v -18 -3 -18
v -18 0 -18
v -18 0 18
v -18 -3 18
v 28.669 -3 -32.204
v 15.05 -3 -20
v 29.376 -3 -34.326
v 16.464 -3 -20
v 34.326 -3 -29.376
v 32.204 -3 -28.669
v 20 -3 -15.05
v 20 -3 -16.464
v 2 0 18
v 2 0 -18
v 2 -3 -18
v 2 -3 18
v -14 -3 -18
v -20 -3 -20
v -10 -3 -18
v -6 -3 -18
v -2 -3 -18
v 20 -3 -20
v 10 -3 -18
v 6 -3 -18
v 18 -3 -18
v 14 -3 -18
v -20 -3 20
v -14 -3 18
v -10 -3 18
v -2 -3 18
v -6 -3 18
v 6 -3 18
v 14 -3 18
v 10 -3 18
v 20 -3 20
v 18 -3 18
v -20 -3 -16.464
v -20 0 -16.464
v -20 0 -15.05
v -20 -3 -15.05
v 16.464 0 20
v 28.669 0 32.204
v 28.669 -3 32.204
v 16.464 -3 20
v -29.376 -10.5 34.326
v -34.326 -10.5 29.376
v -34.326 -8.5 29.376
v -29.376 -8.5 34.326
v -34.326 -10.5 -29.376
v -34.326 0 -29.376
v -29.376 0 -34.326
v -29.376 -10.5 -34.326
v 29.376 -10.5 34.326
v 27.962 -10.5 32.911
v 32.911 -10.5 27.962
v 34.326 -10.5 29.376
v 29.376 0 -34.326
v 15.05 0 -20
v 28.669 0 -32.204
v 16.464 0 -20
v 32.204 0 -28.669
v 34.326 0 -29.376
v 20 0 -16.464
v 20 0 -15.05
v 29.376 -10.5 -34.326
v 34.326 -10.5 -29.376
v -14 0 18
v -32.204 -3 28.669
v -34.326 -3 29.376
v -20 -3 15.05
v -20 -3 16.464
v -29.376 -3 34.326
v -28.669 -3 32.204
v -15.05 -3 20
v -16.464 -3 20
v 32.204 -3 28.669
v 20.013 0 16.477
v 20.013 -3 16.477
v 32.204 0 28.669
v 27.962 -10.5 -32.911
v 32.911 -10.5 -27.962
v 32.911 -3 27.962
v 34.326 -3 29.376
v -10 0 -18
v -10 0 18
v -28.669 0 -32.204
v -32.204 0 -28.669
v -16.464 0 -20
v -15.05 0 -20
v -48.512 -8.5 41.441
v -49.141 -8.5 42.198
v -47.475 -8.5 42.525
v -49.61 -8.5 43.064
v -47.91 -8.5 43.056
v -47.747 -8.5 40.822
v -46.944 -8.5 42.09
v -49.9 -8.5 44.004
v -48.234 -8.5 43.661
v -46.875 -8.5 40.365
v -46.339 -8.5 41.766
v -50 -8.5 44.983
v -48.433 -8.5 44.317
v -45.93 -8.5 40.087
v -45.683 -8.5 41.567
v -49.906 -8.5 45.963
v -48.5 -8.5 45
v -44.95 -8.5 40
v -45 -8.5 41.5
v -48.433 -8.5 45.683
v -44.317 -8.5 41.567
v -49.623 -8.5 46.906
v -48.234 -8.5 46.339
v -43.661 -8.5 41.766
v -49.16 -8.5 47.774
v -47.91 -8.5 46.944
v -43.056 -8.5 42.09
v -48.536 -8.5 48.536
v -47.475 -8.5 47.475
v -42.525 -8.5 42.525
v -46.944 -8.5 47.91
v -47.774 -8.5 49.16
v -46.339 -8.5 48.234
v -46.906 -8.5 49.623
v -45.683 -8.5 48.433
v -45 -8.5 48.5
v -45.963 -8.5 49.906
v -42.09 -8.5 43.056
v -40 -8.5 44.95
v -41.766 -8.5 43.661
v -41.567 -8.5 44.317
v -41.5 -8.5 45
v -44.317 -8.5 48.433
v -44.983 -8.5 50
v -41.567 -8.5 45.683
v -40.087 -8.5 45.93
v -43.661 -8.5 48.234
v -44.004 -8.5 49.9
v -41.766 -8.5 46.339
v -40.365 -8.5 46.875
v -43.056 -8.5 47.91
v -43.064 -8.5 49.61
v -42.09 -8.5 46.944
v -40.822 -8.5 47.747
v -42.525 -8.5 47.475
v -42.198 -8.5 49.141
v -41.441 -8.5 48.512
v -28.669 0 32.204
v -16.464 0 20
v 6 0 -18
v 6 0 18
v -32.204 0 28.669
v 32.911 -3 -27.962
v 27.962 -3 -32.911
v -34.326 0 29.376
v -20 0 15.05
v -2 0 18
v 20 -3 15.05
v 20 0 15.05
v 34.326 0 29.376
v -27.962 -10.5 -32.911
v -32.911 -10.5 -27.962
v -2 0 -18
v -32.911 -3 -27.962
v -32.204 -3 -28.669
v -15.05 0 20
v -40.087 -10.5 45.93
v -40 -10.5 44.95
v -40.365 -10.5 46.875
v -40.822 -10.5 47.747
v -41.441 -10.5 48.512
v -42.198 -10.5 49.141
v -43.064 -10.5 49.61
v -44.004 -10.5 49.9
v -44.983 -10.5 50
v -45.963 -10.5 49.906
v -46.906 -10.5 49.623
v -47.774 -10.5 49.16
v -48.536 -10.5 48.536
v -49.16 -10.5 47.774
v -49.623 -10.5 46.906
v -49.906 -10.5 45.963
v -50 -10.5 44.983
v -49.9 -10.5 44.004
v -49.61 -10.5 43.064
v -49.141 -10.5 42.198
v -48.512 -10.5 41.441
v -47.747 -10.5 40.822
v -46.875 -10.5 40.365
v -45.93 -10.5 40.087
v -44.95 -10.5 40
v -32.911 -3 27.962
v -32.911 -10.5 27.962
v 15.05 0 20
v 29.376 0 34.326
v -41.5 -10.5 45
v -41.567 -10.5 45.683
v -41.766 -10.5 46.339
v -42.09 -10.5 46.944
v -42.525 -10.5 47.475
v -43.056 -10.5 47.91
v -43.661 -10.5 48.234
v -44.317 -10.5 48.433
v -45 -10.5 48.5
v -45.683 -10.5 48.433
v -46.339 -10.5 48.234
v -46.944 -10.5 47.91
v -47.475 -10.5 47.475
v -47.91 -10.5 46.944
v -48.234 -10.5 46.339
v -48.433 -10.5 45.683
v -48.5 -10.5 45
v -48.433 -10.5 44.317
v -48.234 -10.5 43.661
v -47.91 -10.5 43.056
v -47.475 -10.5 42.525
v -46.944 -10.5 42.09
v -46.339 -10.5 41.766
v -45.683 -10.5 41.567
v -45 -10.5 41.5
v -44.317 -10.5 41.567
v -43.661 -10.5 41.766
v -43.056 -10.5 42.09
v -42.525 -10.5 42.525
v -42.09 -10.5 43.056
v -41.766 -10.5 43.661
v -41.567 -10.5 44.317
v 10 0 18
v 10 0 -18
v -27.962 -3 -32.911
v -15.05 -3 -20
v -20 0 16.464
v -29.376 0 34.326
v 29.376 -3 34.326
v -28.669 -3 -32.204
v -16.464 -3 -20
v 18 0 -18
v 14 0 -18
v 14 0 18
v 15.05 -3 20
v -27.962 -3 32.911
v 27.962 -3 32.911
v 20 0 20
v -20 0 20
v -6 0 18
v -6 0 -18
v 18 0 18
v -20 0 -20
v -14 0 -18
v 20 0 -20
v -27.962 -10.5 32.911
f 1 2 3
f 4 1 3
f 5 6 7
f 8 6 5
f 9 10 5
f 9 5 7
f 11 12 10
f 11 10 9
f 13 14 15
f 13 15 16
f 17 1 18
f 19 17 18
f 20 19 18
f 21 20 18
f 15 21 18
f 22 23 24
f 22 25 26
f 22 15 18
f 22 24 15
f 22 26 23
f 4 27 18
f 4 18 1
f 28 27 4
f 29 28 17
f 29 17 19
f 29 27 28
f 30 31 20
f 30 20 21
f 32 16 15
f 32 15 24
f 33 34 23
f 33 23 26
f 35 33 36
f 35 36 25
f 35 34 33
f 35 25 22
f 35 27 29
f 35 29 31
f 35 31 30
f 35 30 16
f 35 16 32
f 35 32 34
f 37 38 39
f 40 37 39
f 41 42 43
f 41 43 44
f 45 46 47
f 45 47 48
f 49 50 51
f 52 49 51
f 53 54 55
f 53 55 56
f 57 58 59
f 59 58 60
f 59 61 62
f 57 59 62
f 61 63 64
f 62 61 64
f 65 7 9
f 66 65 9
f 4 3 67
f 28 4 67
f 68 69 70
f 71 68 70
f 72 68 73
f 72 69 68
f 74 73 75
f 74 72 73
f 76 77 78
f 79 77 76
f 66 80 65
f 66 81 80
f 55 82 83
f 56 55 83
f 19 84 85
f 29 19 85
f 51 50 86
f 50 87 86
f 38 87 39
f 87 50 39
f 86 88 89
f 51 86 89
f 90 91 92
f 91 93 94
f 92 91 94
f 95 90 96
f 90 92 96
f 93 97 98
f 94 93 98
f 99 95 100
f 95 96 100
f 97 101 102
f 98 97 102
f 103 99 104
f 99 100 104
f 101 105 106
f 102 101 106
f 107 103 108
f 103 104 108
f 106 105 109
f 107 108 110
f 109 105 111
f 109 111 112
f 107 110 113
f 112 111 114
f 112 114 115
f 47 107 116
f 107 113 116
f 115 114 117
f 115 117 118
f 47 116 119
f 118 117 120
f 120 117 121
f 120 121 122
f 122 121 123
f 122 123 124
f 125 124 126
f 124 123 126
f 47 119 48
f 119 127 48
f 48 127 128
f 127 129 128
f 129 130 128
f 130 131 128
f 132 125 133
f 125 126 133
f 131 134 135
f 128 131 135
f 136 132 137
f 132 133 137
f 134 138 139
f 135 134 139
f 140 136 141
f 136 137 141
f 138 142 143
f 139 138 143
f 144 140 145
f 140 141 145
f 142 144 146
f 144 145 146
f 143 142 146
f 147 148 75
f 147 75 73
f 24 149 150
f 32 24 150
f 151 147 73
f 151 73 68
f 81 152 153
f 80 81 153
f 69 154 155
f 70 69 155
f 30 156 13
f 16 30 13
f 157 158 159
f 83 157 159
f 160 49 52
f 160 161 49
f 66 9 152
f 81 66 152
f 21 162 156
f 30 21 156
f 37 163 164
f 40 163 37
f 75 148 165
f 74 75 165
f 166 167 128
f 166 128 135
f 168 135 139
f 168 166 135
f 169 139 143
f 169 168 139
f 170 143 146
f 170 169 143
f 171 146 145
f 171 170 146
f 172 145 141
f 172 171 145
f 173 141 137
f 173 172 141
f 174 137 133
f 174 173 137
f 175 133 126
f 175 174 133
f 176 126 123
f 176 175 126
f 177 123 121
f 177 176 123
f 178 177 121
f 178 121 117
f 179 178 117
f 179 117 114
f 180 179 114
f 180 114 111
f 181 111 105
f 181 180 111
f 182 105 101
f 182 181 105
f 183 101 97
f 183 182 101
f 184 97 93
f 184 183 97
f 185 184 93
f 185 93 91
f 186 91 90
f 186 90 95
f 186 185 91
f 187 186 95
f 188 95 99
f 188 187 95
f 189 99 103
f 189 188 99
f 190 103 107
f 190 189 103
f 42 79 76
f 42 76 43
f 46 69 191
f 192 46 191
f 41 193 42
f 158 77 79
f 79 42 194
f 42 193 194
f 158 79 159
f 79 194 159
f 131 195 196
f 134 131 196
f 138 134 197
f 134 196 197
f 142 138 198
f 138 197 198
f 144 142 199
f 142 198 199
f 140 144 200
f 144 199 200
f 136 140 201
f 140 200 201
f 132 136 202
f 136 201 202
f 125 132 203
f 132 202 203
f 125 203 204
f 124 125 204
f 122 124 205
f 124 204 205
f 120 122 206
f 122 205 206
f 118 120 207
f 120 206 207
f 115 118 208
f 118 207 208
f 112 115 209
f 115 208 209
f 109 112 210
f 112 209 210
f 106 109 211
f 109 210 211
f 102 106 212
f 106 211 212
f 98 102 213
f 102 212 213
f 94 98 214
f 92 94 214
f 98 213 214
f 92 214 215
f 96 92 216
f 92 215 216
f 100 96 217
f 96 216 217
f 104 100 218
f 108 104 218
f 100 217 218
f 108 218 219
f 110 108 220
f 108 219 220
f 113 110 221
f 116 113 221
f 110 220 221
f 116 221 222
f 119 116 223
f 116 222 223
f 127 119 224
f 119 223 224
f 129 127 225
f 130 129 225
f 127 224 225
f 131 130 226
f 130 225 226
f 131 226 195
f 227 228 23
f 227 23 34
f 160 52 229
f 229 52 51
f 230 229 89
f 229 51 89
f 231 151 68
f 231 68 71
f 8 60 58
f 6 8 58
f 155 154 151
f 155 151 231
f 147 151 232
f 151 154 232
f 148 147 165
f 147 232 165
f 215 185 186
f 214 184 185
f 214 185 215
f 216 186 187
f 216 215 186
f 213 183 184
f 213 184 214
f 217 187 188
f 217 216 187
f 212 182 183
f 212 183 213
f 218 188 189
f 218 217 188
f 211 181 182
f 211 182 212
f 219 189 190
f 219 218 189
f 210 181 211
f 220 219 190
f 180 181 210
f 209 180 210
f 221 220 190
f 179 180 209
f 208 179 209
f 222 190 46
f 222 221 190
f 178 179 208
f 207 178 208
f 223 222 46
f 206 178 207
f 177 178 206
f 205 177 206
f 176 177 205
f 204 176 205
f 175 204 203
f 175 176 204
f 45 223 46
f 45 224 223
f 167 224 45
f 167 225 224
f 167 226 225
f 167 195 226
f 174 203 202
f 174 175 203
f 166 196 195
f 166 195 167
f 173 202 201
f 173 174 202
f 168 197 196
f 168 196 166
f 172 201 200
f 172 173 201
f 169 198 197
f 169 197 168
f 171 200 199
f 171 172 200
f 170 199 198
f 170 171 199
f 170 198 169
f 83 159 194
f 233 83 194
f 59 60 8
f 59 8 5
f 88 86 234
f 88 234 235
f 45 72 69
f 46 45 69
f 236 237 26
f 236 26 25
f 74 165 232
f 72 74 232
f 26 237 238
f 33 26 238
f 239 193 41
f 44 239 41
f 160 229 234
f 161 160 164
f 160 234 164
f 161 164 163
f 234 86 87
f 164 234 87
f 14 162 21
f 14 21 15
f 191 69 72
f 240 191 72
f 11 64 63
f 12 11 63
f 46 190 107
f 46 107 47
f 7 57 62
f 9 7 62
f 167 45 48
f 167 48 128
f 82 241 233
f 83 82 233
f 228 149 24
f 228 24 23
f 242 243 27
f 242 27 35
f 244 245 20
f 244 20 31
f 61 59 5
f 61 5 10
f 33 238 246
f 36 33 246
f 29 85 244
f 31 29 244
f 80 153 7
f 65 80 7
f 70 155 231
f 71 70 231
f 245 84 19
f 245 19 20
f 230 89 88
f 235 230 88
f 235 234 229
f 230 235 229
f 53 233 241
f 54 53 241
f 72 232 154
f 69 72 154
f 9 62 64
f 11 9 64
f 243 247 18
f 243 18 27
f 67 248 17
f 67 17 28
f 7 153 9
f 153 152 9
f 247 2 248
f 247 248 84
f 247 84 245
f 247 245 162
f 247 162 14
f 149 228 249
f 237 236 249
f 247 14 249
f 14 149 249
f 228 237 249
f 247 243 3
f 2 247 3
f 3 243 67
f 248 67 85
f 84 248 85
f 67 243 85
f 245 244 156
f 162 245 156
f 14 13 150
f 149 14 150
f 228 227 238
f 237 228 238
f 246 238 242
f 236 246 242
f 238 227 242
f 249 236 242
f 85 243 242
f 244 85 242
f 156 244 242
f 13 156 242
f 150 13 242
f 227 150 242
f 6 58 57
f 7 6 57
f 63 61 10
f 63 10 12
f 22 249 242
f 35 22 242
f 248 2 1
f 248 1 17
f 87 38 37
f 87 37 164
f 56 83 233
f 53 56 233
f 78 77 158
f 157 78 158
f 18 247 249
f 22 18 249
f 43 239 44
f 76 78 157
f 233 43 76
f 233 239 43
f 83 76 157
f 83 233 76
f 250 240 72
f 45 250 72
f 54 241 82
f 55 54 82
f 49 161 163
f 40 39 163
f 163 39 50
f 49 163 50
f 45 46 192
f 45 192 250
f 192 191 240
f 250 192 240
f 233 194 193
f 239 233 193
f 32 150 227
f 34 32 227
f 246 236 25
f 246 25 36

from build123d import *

# Parameters (mm, degrees)
F0_W      = 40
F0_H      = 40
F0_W_2    = 4
F0_H_2    = 36
F1_DEPTH  = 3
F3_DEPTH  = 3
F4_DEPTH  = 25
F5_DEPTH  = 25
F6_DEPTH  = 25
F7_DEPTH  = 25
F9_DEPTH  = 7.5
F10_R     = 3.5
F11_DEPTH = 2


# Not quite as in the source:
# - the program builds the solid bodies; features that only make, move or delete a surface that nothing else refers to are left out


with BuildPart() as f1:
    # F0 (on Front) → F1 (new body)
    with BuildSketch(Plane.XZ):
        Rectangle(F0_W, F0_H)
        with Locations((-16, 0)):
            Rectangle(F0_W_2, F0_H_2, mode=Mode.SUBTRACT)
        with Locations((-8, 0)):
            Rectangle(F0_W_2, F0_H_2, mode=Mode.SUBTRACT)
        Rectangle(F0_W_2, F0_H_2, mode=Mode.SUBTRACT)
        with Locations((8, 0)):
            Rectangle(F0_W_2, F0_H_2, mode=Mode.SUBTRACT)
        with Locations((16, 0)):
            Rectangle(F0_W_2, F0_H_2, mode=Mode.SUBTRACT)
    extrude(amount=F1_DEPTH)


with BuildPart() as f3:
    # F2 (on Front) → F3 (new body)
    with BuildSketch(Plane.XZ):
        Polygon((27.9616906966, 32.9114381649), (15.0502525317, 20), (16.4644660941, 20), (28.6687974778, 32.2043313837), align=None)
        Polygon((29.3759042589, 34.3256517272), (27.9616906966, 32.9114381649), (28.6687974778, 32.2043313837), (32.2043313837, 28.6687974778), (32.9114381649, 27.9616906966), (34.3256517272, 29.3759042589), align=None)
        Polygon((28.6687974778, 32.2043313837), (16.4644660941, 20), (20.0434662402, 20), (20.0125289488, 16.4769950429), (32.2043313837, 28.6687974778), align=None)
        Polygon((32.9114381649, 27.9616906966), (32.2043313837, 28.6687974778), (20.0125289488, 16.4769950429), (20, 15.0502525317), align=None)
    extrude(amount=F3_DEPTH)

    # F2 (on Front) → F4 (cut)
    with BuildSketch(Plane.XZ):
        Polygon((28.6687974778, 32.2043313837), (16.4644660941, 20), (20.0434662402, 20), (20.0125289488, 16.4769950429), (32.2043313837, 28.6687974778), align=None)
    extrude(amount=F4_DEPTH, mode=Mode.SUBTRACT)


with BuildPart() as f3b:
    # F2 (on Front) → F3, piece 2 (new body)
    with BuildSketch(Plane.XZ):
        Polygon((-16.4644660941, 20), (-28.6687974778, 32.2043313837), (-32.2043313837, 28.6687974778), (-20, 16.4644660941), (-20, 20), align=None)
        Polygon((-27.9616906966, 32.9114381649), (-28.6687974778, 32.2043313837), (-16.4644660941, 20), (-15.0502525317, 20), align=None)
        Polygon((-32.2043313837, 28.6687974778), (-28.6687974778, 32.2043313837), (-27.9616906966, 32.9114381649), (-29.3759042589, 34.3256517272), (-34.3256517272, 29.3759042589), (-32.9114381649, 27.9616906966), align=None)
        Polygon((-20, 16.4644660941), (-32.2043313837, 28.6687974778), (-32.9114381649, 27.9616906966), (-20, 15.0502525317), align=None)
    extrude(amount=F3_DEPTH)

    # F2 (on Front) → F5 (cut)
    with BuildSketch(Plane.XZ):
        Polygon((-16.4644660941, 20), (-28.6687974778, 32.2043313837), (-32.2043313837, 28.6687974778), (-20, 16.4644660941), (-20, 20), align=None)
    extrude(amount=F5_DEPTH, mode=Mode.SUBTRACT)


with BuildPart() as f3c:
    # F2 (on Front) → F3, piece 3 (new body)
    with BuildSketch(Plane.XZ):
        Polygon((-27.9616906966, -32.9114381649), (-28.6687974778, -32.2043313837), (-32.2043313837, -28.6687974778), (-32.9114381649, -27.9616906966), (-34.3256517272, -29.3759042589), (-29.3759042589, -34.3256517272), align=None)
        Polygon((-32.2043313837, -28.6687974778), (-28.6687974778, -32.2043313837), (-16.4644660941, -20), (-20, -20), (-20, -16.4644660941), align=None)
        Polygon((-16.4644660941, -20), (-28.6687974778, -32.2043313837), (-27.9616906966, -32.9114381649), (-15.0502525317, -20), align=None)
        Polygon((-32.9114381649, -27.9616906966), (-32.2043313837, -28.6687974778), (-20, -16.4644660941), (-20, -15.0502525317), align=None)
    extrude(amount=F3_DEPTH)

    # F2 (on Front) → F7 (cut)
    with BuildSketch(Plane.XZ):
        Polygon((-32.2043313837, -28.6687974778), (-28.6687974778, -32.2043313837), (-16.4644660941, -20), (-20, -20), (-20, -16.4644660941), align=None)
    extrude(amount=F7_DEPTH, mode=Mode.SUBTRACT)

    # F8 (on face) → F9 (join)
    with BuildSketch(Plane.XZ.offset(3)):
        Polygon((-34.3256517272, -29.3759042589), (-29.3759042589, -34.3256517272), (-27.9616906966, -32.9114381649), (-28.6687974778, -32.2043313837), (-32.2043313837, -28.6687974778), (-32.9114381649, -27.9616906966), align=None)
    extrude(amount=F9_DEPTH)


with BuildPart() as f3d:
    # F2 (on Front) → F3, piece 4 (new body)
    with BuildSketch(Plane.XZ):
        Polygon((16.4644660941, -20), (28.6687974778, -32.2043313837), (32.2043313837, -28.6687974778), (20, -16.4644660941), (20, -20), align=None)
        Polygon((27.9616906966, -32.9114381649), (28.6687974778, -32.2043313837), (16.4644660941, -20), (15.0502525317, -20), align=None)
        Polygon((32.2043313837, -28.6687974778), (28.6687974778, -32.2043313837), (27.9616906966, -32.9114381649), (29.3759042589, -34.3256517272), (34.3256517272, -29.3759042589), (32.9114381649, -27.9616906966), align=None)
        Polygon((20, -16.4644660941), (32.2043313837, -28.6687974778), (32.9114381649, -27.9616906966), (20, -15.0502525317), align=None)
    extrude(amount=F3_DEPTH)

    # F2 (on Front) → F6 (cut)
    with BuildSketch(Plane.XZ):
        Polygon((16.4644660941, -20), (28.6687974778, -32.2043313837), (32.2043313837, -28.6687974778), (20, -16.4644660941), (20, -20), align=None)
    extrude(amount=F6_DEPTH, mode=Mode.SUBTRACT)


with BuildPart() as f9:
    # F8 (on face) → F9, piece 2 (new body)
    with BuildSketch(Plane.XZ.offset(3)):
        Polygon((32.2043313837, -28.6687974778), (28.6687974778, -32.2043313837), (27.9616906966, -32.9114381649), (29.3759042589, -34.3256517272), (34.3256517272, -29.3759042589), (32.9114381649, -27.9616906966), align=None)
    extrude(amount=F9_DEPTH)


with BuildPart() as f9b:
    # F8 (on face) → F9, piece 3 (new body)
    with BuildSketch(Plane.XZ.offset(3)):
        Polygon((-27.9616906966, 32.9114381649), (-29.3759042589, 34.3256517272), (-34.3256517272, 29.3759042589), (-32.9114381649, 27.9616906966), (-32.2043313837, 28.6687974778), (-28.6687974778, 32.2043313837), align=None)
    extrude(amount=F9_DEPTH)


with BuildPart() as f9c:
    # F8 (on face) → F9, piece 4 (new body)
    with BuildSketch(Plane.XZ.offset(3)):
        Polygon((34.3256517272, 29.3759042589), (29.3759042589, 34.3256517272), (27.9616906966, 32.9114381649), (28.6687974778, 32.2043313837), (32.2043313837, 28.6687974778), (32.9114381649, 27.9616906966), align=None)
    extrude(amount=F9_DEPTH)


with BuildPart() as f11:
    # F10 (on face) → F11 (new body)
    with BuildSketch(Plane.XZ.offset(10.5)):
        with BuildLine():
            Line((-34.3256517272, 29.3759042589), (-29.3759042589, 34.3256517272))
            Line((-29.3759042589, 34.3256517272), (-40.0002500313, 44.9499974996))
            ThreePointArc((-40.0002500313, 44.9499974996), (-48.5355339059, 48.5355339059), (-44.9499974996, 40.0002500313))
            Line((-44.9499974996, 40.0002500313), (-34.3256517272, 29.3759042589))
        make_face()
        with Locations((-45, 45)):
            Circle(F10_R, mode=Mode.SUBTRACT)
    extrude(amount=-F11_DEPTH)


solid = Compound([f1.part, f3.part, f3b.part, f3c.part, f3d.part, f9.part, f9b.part, f9c.part, f11.part])
